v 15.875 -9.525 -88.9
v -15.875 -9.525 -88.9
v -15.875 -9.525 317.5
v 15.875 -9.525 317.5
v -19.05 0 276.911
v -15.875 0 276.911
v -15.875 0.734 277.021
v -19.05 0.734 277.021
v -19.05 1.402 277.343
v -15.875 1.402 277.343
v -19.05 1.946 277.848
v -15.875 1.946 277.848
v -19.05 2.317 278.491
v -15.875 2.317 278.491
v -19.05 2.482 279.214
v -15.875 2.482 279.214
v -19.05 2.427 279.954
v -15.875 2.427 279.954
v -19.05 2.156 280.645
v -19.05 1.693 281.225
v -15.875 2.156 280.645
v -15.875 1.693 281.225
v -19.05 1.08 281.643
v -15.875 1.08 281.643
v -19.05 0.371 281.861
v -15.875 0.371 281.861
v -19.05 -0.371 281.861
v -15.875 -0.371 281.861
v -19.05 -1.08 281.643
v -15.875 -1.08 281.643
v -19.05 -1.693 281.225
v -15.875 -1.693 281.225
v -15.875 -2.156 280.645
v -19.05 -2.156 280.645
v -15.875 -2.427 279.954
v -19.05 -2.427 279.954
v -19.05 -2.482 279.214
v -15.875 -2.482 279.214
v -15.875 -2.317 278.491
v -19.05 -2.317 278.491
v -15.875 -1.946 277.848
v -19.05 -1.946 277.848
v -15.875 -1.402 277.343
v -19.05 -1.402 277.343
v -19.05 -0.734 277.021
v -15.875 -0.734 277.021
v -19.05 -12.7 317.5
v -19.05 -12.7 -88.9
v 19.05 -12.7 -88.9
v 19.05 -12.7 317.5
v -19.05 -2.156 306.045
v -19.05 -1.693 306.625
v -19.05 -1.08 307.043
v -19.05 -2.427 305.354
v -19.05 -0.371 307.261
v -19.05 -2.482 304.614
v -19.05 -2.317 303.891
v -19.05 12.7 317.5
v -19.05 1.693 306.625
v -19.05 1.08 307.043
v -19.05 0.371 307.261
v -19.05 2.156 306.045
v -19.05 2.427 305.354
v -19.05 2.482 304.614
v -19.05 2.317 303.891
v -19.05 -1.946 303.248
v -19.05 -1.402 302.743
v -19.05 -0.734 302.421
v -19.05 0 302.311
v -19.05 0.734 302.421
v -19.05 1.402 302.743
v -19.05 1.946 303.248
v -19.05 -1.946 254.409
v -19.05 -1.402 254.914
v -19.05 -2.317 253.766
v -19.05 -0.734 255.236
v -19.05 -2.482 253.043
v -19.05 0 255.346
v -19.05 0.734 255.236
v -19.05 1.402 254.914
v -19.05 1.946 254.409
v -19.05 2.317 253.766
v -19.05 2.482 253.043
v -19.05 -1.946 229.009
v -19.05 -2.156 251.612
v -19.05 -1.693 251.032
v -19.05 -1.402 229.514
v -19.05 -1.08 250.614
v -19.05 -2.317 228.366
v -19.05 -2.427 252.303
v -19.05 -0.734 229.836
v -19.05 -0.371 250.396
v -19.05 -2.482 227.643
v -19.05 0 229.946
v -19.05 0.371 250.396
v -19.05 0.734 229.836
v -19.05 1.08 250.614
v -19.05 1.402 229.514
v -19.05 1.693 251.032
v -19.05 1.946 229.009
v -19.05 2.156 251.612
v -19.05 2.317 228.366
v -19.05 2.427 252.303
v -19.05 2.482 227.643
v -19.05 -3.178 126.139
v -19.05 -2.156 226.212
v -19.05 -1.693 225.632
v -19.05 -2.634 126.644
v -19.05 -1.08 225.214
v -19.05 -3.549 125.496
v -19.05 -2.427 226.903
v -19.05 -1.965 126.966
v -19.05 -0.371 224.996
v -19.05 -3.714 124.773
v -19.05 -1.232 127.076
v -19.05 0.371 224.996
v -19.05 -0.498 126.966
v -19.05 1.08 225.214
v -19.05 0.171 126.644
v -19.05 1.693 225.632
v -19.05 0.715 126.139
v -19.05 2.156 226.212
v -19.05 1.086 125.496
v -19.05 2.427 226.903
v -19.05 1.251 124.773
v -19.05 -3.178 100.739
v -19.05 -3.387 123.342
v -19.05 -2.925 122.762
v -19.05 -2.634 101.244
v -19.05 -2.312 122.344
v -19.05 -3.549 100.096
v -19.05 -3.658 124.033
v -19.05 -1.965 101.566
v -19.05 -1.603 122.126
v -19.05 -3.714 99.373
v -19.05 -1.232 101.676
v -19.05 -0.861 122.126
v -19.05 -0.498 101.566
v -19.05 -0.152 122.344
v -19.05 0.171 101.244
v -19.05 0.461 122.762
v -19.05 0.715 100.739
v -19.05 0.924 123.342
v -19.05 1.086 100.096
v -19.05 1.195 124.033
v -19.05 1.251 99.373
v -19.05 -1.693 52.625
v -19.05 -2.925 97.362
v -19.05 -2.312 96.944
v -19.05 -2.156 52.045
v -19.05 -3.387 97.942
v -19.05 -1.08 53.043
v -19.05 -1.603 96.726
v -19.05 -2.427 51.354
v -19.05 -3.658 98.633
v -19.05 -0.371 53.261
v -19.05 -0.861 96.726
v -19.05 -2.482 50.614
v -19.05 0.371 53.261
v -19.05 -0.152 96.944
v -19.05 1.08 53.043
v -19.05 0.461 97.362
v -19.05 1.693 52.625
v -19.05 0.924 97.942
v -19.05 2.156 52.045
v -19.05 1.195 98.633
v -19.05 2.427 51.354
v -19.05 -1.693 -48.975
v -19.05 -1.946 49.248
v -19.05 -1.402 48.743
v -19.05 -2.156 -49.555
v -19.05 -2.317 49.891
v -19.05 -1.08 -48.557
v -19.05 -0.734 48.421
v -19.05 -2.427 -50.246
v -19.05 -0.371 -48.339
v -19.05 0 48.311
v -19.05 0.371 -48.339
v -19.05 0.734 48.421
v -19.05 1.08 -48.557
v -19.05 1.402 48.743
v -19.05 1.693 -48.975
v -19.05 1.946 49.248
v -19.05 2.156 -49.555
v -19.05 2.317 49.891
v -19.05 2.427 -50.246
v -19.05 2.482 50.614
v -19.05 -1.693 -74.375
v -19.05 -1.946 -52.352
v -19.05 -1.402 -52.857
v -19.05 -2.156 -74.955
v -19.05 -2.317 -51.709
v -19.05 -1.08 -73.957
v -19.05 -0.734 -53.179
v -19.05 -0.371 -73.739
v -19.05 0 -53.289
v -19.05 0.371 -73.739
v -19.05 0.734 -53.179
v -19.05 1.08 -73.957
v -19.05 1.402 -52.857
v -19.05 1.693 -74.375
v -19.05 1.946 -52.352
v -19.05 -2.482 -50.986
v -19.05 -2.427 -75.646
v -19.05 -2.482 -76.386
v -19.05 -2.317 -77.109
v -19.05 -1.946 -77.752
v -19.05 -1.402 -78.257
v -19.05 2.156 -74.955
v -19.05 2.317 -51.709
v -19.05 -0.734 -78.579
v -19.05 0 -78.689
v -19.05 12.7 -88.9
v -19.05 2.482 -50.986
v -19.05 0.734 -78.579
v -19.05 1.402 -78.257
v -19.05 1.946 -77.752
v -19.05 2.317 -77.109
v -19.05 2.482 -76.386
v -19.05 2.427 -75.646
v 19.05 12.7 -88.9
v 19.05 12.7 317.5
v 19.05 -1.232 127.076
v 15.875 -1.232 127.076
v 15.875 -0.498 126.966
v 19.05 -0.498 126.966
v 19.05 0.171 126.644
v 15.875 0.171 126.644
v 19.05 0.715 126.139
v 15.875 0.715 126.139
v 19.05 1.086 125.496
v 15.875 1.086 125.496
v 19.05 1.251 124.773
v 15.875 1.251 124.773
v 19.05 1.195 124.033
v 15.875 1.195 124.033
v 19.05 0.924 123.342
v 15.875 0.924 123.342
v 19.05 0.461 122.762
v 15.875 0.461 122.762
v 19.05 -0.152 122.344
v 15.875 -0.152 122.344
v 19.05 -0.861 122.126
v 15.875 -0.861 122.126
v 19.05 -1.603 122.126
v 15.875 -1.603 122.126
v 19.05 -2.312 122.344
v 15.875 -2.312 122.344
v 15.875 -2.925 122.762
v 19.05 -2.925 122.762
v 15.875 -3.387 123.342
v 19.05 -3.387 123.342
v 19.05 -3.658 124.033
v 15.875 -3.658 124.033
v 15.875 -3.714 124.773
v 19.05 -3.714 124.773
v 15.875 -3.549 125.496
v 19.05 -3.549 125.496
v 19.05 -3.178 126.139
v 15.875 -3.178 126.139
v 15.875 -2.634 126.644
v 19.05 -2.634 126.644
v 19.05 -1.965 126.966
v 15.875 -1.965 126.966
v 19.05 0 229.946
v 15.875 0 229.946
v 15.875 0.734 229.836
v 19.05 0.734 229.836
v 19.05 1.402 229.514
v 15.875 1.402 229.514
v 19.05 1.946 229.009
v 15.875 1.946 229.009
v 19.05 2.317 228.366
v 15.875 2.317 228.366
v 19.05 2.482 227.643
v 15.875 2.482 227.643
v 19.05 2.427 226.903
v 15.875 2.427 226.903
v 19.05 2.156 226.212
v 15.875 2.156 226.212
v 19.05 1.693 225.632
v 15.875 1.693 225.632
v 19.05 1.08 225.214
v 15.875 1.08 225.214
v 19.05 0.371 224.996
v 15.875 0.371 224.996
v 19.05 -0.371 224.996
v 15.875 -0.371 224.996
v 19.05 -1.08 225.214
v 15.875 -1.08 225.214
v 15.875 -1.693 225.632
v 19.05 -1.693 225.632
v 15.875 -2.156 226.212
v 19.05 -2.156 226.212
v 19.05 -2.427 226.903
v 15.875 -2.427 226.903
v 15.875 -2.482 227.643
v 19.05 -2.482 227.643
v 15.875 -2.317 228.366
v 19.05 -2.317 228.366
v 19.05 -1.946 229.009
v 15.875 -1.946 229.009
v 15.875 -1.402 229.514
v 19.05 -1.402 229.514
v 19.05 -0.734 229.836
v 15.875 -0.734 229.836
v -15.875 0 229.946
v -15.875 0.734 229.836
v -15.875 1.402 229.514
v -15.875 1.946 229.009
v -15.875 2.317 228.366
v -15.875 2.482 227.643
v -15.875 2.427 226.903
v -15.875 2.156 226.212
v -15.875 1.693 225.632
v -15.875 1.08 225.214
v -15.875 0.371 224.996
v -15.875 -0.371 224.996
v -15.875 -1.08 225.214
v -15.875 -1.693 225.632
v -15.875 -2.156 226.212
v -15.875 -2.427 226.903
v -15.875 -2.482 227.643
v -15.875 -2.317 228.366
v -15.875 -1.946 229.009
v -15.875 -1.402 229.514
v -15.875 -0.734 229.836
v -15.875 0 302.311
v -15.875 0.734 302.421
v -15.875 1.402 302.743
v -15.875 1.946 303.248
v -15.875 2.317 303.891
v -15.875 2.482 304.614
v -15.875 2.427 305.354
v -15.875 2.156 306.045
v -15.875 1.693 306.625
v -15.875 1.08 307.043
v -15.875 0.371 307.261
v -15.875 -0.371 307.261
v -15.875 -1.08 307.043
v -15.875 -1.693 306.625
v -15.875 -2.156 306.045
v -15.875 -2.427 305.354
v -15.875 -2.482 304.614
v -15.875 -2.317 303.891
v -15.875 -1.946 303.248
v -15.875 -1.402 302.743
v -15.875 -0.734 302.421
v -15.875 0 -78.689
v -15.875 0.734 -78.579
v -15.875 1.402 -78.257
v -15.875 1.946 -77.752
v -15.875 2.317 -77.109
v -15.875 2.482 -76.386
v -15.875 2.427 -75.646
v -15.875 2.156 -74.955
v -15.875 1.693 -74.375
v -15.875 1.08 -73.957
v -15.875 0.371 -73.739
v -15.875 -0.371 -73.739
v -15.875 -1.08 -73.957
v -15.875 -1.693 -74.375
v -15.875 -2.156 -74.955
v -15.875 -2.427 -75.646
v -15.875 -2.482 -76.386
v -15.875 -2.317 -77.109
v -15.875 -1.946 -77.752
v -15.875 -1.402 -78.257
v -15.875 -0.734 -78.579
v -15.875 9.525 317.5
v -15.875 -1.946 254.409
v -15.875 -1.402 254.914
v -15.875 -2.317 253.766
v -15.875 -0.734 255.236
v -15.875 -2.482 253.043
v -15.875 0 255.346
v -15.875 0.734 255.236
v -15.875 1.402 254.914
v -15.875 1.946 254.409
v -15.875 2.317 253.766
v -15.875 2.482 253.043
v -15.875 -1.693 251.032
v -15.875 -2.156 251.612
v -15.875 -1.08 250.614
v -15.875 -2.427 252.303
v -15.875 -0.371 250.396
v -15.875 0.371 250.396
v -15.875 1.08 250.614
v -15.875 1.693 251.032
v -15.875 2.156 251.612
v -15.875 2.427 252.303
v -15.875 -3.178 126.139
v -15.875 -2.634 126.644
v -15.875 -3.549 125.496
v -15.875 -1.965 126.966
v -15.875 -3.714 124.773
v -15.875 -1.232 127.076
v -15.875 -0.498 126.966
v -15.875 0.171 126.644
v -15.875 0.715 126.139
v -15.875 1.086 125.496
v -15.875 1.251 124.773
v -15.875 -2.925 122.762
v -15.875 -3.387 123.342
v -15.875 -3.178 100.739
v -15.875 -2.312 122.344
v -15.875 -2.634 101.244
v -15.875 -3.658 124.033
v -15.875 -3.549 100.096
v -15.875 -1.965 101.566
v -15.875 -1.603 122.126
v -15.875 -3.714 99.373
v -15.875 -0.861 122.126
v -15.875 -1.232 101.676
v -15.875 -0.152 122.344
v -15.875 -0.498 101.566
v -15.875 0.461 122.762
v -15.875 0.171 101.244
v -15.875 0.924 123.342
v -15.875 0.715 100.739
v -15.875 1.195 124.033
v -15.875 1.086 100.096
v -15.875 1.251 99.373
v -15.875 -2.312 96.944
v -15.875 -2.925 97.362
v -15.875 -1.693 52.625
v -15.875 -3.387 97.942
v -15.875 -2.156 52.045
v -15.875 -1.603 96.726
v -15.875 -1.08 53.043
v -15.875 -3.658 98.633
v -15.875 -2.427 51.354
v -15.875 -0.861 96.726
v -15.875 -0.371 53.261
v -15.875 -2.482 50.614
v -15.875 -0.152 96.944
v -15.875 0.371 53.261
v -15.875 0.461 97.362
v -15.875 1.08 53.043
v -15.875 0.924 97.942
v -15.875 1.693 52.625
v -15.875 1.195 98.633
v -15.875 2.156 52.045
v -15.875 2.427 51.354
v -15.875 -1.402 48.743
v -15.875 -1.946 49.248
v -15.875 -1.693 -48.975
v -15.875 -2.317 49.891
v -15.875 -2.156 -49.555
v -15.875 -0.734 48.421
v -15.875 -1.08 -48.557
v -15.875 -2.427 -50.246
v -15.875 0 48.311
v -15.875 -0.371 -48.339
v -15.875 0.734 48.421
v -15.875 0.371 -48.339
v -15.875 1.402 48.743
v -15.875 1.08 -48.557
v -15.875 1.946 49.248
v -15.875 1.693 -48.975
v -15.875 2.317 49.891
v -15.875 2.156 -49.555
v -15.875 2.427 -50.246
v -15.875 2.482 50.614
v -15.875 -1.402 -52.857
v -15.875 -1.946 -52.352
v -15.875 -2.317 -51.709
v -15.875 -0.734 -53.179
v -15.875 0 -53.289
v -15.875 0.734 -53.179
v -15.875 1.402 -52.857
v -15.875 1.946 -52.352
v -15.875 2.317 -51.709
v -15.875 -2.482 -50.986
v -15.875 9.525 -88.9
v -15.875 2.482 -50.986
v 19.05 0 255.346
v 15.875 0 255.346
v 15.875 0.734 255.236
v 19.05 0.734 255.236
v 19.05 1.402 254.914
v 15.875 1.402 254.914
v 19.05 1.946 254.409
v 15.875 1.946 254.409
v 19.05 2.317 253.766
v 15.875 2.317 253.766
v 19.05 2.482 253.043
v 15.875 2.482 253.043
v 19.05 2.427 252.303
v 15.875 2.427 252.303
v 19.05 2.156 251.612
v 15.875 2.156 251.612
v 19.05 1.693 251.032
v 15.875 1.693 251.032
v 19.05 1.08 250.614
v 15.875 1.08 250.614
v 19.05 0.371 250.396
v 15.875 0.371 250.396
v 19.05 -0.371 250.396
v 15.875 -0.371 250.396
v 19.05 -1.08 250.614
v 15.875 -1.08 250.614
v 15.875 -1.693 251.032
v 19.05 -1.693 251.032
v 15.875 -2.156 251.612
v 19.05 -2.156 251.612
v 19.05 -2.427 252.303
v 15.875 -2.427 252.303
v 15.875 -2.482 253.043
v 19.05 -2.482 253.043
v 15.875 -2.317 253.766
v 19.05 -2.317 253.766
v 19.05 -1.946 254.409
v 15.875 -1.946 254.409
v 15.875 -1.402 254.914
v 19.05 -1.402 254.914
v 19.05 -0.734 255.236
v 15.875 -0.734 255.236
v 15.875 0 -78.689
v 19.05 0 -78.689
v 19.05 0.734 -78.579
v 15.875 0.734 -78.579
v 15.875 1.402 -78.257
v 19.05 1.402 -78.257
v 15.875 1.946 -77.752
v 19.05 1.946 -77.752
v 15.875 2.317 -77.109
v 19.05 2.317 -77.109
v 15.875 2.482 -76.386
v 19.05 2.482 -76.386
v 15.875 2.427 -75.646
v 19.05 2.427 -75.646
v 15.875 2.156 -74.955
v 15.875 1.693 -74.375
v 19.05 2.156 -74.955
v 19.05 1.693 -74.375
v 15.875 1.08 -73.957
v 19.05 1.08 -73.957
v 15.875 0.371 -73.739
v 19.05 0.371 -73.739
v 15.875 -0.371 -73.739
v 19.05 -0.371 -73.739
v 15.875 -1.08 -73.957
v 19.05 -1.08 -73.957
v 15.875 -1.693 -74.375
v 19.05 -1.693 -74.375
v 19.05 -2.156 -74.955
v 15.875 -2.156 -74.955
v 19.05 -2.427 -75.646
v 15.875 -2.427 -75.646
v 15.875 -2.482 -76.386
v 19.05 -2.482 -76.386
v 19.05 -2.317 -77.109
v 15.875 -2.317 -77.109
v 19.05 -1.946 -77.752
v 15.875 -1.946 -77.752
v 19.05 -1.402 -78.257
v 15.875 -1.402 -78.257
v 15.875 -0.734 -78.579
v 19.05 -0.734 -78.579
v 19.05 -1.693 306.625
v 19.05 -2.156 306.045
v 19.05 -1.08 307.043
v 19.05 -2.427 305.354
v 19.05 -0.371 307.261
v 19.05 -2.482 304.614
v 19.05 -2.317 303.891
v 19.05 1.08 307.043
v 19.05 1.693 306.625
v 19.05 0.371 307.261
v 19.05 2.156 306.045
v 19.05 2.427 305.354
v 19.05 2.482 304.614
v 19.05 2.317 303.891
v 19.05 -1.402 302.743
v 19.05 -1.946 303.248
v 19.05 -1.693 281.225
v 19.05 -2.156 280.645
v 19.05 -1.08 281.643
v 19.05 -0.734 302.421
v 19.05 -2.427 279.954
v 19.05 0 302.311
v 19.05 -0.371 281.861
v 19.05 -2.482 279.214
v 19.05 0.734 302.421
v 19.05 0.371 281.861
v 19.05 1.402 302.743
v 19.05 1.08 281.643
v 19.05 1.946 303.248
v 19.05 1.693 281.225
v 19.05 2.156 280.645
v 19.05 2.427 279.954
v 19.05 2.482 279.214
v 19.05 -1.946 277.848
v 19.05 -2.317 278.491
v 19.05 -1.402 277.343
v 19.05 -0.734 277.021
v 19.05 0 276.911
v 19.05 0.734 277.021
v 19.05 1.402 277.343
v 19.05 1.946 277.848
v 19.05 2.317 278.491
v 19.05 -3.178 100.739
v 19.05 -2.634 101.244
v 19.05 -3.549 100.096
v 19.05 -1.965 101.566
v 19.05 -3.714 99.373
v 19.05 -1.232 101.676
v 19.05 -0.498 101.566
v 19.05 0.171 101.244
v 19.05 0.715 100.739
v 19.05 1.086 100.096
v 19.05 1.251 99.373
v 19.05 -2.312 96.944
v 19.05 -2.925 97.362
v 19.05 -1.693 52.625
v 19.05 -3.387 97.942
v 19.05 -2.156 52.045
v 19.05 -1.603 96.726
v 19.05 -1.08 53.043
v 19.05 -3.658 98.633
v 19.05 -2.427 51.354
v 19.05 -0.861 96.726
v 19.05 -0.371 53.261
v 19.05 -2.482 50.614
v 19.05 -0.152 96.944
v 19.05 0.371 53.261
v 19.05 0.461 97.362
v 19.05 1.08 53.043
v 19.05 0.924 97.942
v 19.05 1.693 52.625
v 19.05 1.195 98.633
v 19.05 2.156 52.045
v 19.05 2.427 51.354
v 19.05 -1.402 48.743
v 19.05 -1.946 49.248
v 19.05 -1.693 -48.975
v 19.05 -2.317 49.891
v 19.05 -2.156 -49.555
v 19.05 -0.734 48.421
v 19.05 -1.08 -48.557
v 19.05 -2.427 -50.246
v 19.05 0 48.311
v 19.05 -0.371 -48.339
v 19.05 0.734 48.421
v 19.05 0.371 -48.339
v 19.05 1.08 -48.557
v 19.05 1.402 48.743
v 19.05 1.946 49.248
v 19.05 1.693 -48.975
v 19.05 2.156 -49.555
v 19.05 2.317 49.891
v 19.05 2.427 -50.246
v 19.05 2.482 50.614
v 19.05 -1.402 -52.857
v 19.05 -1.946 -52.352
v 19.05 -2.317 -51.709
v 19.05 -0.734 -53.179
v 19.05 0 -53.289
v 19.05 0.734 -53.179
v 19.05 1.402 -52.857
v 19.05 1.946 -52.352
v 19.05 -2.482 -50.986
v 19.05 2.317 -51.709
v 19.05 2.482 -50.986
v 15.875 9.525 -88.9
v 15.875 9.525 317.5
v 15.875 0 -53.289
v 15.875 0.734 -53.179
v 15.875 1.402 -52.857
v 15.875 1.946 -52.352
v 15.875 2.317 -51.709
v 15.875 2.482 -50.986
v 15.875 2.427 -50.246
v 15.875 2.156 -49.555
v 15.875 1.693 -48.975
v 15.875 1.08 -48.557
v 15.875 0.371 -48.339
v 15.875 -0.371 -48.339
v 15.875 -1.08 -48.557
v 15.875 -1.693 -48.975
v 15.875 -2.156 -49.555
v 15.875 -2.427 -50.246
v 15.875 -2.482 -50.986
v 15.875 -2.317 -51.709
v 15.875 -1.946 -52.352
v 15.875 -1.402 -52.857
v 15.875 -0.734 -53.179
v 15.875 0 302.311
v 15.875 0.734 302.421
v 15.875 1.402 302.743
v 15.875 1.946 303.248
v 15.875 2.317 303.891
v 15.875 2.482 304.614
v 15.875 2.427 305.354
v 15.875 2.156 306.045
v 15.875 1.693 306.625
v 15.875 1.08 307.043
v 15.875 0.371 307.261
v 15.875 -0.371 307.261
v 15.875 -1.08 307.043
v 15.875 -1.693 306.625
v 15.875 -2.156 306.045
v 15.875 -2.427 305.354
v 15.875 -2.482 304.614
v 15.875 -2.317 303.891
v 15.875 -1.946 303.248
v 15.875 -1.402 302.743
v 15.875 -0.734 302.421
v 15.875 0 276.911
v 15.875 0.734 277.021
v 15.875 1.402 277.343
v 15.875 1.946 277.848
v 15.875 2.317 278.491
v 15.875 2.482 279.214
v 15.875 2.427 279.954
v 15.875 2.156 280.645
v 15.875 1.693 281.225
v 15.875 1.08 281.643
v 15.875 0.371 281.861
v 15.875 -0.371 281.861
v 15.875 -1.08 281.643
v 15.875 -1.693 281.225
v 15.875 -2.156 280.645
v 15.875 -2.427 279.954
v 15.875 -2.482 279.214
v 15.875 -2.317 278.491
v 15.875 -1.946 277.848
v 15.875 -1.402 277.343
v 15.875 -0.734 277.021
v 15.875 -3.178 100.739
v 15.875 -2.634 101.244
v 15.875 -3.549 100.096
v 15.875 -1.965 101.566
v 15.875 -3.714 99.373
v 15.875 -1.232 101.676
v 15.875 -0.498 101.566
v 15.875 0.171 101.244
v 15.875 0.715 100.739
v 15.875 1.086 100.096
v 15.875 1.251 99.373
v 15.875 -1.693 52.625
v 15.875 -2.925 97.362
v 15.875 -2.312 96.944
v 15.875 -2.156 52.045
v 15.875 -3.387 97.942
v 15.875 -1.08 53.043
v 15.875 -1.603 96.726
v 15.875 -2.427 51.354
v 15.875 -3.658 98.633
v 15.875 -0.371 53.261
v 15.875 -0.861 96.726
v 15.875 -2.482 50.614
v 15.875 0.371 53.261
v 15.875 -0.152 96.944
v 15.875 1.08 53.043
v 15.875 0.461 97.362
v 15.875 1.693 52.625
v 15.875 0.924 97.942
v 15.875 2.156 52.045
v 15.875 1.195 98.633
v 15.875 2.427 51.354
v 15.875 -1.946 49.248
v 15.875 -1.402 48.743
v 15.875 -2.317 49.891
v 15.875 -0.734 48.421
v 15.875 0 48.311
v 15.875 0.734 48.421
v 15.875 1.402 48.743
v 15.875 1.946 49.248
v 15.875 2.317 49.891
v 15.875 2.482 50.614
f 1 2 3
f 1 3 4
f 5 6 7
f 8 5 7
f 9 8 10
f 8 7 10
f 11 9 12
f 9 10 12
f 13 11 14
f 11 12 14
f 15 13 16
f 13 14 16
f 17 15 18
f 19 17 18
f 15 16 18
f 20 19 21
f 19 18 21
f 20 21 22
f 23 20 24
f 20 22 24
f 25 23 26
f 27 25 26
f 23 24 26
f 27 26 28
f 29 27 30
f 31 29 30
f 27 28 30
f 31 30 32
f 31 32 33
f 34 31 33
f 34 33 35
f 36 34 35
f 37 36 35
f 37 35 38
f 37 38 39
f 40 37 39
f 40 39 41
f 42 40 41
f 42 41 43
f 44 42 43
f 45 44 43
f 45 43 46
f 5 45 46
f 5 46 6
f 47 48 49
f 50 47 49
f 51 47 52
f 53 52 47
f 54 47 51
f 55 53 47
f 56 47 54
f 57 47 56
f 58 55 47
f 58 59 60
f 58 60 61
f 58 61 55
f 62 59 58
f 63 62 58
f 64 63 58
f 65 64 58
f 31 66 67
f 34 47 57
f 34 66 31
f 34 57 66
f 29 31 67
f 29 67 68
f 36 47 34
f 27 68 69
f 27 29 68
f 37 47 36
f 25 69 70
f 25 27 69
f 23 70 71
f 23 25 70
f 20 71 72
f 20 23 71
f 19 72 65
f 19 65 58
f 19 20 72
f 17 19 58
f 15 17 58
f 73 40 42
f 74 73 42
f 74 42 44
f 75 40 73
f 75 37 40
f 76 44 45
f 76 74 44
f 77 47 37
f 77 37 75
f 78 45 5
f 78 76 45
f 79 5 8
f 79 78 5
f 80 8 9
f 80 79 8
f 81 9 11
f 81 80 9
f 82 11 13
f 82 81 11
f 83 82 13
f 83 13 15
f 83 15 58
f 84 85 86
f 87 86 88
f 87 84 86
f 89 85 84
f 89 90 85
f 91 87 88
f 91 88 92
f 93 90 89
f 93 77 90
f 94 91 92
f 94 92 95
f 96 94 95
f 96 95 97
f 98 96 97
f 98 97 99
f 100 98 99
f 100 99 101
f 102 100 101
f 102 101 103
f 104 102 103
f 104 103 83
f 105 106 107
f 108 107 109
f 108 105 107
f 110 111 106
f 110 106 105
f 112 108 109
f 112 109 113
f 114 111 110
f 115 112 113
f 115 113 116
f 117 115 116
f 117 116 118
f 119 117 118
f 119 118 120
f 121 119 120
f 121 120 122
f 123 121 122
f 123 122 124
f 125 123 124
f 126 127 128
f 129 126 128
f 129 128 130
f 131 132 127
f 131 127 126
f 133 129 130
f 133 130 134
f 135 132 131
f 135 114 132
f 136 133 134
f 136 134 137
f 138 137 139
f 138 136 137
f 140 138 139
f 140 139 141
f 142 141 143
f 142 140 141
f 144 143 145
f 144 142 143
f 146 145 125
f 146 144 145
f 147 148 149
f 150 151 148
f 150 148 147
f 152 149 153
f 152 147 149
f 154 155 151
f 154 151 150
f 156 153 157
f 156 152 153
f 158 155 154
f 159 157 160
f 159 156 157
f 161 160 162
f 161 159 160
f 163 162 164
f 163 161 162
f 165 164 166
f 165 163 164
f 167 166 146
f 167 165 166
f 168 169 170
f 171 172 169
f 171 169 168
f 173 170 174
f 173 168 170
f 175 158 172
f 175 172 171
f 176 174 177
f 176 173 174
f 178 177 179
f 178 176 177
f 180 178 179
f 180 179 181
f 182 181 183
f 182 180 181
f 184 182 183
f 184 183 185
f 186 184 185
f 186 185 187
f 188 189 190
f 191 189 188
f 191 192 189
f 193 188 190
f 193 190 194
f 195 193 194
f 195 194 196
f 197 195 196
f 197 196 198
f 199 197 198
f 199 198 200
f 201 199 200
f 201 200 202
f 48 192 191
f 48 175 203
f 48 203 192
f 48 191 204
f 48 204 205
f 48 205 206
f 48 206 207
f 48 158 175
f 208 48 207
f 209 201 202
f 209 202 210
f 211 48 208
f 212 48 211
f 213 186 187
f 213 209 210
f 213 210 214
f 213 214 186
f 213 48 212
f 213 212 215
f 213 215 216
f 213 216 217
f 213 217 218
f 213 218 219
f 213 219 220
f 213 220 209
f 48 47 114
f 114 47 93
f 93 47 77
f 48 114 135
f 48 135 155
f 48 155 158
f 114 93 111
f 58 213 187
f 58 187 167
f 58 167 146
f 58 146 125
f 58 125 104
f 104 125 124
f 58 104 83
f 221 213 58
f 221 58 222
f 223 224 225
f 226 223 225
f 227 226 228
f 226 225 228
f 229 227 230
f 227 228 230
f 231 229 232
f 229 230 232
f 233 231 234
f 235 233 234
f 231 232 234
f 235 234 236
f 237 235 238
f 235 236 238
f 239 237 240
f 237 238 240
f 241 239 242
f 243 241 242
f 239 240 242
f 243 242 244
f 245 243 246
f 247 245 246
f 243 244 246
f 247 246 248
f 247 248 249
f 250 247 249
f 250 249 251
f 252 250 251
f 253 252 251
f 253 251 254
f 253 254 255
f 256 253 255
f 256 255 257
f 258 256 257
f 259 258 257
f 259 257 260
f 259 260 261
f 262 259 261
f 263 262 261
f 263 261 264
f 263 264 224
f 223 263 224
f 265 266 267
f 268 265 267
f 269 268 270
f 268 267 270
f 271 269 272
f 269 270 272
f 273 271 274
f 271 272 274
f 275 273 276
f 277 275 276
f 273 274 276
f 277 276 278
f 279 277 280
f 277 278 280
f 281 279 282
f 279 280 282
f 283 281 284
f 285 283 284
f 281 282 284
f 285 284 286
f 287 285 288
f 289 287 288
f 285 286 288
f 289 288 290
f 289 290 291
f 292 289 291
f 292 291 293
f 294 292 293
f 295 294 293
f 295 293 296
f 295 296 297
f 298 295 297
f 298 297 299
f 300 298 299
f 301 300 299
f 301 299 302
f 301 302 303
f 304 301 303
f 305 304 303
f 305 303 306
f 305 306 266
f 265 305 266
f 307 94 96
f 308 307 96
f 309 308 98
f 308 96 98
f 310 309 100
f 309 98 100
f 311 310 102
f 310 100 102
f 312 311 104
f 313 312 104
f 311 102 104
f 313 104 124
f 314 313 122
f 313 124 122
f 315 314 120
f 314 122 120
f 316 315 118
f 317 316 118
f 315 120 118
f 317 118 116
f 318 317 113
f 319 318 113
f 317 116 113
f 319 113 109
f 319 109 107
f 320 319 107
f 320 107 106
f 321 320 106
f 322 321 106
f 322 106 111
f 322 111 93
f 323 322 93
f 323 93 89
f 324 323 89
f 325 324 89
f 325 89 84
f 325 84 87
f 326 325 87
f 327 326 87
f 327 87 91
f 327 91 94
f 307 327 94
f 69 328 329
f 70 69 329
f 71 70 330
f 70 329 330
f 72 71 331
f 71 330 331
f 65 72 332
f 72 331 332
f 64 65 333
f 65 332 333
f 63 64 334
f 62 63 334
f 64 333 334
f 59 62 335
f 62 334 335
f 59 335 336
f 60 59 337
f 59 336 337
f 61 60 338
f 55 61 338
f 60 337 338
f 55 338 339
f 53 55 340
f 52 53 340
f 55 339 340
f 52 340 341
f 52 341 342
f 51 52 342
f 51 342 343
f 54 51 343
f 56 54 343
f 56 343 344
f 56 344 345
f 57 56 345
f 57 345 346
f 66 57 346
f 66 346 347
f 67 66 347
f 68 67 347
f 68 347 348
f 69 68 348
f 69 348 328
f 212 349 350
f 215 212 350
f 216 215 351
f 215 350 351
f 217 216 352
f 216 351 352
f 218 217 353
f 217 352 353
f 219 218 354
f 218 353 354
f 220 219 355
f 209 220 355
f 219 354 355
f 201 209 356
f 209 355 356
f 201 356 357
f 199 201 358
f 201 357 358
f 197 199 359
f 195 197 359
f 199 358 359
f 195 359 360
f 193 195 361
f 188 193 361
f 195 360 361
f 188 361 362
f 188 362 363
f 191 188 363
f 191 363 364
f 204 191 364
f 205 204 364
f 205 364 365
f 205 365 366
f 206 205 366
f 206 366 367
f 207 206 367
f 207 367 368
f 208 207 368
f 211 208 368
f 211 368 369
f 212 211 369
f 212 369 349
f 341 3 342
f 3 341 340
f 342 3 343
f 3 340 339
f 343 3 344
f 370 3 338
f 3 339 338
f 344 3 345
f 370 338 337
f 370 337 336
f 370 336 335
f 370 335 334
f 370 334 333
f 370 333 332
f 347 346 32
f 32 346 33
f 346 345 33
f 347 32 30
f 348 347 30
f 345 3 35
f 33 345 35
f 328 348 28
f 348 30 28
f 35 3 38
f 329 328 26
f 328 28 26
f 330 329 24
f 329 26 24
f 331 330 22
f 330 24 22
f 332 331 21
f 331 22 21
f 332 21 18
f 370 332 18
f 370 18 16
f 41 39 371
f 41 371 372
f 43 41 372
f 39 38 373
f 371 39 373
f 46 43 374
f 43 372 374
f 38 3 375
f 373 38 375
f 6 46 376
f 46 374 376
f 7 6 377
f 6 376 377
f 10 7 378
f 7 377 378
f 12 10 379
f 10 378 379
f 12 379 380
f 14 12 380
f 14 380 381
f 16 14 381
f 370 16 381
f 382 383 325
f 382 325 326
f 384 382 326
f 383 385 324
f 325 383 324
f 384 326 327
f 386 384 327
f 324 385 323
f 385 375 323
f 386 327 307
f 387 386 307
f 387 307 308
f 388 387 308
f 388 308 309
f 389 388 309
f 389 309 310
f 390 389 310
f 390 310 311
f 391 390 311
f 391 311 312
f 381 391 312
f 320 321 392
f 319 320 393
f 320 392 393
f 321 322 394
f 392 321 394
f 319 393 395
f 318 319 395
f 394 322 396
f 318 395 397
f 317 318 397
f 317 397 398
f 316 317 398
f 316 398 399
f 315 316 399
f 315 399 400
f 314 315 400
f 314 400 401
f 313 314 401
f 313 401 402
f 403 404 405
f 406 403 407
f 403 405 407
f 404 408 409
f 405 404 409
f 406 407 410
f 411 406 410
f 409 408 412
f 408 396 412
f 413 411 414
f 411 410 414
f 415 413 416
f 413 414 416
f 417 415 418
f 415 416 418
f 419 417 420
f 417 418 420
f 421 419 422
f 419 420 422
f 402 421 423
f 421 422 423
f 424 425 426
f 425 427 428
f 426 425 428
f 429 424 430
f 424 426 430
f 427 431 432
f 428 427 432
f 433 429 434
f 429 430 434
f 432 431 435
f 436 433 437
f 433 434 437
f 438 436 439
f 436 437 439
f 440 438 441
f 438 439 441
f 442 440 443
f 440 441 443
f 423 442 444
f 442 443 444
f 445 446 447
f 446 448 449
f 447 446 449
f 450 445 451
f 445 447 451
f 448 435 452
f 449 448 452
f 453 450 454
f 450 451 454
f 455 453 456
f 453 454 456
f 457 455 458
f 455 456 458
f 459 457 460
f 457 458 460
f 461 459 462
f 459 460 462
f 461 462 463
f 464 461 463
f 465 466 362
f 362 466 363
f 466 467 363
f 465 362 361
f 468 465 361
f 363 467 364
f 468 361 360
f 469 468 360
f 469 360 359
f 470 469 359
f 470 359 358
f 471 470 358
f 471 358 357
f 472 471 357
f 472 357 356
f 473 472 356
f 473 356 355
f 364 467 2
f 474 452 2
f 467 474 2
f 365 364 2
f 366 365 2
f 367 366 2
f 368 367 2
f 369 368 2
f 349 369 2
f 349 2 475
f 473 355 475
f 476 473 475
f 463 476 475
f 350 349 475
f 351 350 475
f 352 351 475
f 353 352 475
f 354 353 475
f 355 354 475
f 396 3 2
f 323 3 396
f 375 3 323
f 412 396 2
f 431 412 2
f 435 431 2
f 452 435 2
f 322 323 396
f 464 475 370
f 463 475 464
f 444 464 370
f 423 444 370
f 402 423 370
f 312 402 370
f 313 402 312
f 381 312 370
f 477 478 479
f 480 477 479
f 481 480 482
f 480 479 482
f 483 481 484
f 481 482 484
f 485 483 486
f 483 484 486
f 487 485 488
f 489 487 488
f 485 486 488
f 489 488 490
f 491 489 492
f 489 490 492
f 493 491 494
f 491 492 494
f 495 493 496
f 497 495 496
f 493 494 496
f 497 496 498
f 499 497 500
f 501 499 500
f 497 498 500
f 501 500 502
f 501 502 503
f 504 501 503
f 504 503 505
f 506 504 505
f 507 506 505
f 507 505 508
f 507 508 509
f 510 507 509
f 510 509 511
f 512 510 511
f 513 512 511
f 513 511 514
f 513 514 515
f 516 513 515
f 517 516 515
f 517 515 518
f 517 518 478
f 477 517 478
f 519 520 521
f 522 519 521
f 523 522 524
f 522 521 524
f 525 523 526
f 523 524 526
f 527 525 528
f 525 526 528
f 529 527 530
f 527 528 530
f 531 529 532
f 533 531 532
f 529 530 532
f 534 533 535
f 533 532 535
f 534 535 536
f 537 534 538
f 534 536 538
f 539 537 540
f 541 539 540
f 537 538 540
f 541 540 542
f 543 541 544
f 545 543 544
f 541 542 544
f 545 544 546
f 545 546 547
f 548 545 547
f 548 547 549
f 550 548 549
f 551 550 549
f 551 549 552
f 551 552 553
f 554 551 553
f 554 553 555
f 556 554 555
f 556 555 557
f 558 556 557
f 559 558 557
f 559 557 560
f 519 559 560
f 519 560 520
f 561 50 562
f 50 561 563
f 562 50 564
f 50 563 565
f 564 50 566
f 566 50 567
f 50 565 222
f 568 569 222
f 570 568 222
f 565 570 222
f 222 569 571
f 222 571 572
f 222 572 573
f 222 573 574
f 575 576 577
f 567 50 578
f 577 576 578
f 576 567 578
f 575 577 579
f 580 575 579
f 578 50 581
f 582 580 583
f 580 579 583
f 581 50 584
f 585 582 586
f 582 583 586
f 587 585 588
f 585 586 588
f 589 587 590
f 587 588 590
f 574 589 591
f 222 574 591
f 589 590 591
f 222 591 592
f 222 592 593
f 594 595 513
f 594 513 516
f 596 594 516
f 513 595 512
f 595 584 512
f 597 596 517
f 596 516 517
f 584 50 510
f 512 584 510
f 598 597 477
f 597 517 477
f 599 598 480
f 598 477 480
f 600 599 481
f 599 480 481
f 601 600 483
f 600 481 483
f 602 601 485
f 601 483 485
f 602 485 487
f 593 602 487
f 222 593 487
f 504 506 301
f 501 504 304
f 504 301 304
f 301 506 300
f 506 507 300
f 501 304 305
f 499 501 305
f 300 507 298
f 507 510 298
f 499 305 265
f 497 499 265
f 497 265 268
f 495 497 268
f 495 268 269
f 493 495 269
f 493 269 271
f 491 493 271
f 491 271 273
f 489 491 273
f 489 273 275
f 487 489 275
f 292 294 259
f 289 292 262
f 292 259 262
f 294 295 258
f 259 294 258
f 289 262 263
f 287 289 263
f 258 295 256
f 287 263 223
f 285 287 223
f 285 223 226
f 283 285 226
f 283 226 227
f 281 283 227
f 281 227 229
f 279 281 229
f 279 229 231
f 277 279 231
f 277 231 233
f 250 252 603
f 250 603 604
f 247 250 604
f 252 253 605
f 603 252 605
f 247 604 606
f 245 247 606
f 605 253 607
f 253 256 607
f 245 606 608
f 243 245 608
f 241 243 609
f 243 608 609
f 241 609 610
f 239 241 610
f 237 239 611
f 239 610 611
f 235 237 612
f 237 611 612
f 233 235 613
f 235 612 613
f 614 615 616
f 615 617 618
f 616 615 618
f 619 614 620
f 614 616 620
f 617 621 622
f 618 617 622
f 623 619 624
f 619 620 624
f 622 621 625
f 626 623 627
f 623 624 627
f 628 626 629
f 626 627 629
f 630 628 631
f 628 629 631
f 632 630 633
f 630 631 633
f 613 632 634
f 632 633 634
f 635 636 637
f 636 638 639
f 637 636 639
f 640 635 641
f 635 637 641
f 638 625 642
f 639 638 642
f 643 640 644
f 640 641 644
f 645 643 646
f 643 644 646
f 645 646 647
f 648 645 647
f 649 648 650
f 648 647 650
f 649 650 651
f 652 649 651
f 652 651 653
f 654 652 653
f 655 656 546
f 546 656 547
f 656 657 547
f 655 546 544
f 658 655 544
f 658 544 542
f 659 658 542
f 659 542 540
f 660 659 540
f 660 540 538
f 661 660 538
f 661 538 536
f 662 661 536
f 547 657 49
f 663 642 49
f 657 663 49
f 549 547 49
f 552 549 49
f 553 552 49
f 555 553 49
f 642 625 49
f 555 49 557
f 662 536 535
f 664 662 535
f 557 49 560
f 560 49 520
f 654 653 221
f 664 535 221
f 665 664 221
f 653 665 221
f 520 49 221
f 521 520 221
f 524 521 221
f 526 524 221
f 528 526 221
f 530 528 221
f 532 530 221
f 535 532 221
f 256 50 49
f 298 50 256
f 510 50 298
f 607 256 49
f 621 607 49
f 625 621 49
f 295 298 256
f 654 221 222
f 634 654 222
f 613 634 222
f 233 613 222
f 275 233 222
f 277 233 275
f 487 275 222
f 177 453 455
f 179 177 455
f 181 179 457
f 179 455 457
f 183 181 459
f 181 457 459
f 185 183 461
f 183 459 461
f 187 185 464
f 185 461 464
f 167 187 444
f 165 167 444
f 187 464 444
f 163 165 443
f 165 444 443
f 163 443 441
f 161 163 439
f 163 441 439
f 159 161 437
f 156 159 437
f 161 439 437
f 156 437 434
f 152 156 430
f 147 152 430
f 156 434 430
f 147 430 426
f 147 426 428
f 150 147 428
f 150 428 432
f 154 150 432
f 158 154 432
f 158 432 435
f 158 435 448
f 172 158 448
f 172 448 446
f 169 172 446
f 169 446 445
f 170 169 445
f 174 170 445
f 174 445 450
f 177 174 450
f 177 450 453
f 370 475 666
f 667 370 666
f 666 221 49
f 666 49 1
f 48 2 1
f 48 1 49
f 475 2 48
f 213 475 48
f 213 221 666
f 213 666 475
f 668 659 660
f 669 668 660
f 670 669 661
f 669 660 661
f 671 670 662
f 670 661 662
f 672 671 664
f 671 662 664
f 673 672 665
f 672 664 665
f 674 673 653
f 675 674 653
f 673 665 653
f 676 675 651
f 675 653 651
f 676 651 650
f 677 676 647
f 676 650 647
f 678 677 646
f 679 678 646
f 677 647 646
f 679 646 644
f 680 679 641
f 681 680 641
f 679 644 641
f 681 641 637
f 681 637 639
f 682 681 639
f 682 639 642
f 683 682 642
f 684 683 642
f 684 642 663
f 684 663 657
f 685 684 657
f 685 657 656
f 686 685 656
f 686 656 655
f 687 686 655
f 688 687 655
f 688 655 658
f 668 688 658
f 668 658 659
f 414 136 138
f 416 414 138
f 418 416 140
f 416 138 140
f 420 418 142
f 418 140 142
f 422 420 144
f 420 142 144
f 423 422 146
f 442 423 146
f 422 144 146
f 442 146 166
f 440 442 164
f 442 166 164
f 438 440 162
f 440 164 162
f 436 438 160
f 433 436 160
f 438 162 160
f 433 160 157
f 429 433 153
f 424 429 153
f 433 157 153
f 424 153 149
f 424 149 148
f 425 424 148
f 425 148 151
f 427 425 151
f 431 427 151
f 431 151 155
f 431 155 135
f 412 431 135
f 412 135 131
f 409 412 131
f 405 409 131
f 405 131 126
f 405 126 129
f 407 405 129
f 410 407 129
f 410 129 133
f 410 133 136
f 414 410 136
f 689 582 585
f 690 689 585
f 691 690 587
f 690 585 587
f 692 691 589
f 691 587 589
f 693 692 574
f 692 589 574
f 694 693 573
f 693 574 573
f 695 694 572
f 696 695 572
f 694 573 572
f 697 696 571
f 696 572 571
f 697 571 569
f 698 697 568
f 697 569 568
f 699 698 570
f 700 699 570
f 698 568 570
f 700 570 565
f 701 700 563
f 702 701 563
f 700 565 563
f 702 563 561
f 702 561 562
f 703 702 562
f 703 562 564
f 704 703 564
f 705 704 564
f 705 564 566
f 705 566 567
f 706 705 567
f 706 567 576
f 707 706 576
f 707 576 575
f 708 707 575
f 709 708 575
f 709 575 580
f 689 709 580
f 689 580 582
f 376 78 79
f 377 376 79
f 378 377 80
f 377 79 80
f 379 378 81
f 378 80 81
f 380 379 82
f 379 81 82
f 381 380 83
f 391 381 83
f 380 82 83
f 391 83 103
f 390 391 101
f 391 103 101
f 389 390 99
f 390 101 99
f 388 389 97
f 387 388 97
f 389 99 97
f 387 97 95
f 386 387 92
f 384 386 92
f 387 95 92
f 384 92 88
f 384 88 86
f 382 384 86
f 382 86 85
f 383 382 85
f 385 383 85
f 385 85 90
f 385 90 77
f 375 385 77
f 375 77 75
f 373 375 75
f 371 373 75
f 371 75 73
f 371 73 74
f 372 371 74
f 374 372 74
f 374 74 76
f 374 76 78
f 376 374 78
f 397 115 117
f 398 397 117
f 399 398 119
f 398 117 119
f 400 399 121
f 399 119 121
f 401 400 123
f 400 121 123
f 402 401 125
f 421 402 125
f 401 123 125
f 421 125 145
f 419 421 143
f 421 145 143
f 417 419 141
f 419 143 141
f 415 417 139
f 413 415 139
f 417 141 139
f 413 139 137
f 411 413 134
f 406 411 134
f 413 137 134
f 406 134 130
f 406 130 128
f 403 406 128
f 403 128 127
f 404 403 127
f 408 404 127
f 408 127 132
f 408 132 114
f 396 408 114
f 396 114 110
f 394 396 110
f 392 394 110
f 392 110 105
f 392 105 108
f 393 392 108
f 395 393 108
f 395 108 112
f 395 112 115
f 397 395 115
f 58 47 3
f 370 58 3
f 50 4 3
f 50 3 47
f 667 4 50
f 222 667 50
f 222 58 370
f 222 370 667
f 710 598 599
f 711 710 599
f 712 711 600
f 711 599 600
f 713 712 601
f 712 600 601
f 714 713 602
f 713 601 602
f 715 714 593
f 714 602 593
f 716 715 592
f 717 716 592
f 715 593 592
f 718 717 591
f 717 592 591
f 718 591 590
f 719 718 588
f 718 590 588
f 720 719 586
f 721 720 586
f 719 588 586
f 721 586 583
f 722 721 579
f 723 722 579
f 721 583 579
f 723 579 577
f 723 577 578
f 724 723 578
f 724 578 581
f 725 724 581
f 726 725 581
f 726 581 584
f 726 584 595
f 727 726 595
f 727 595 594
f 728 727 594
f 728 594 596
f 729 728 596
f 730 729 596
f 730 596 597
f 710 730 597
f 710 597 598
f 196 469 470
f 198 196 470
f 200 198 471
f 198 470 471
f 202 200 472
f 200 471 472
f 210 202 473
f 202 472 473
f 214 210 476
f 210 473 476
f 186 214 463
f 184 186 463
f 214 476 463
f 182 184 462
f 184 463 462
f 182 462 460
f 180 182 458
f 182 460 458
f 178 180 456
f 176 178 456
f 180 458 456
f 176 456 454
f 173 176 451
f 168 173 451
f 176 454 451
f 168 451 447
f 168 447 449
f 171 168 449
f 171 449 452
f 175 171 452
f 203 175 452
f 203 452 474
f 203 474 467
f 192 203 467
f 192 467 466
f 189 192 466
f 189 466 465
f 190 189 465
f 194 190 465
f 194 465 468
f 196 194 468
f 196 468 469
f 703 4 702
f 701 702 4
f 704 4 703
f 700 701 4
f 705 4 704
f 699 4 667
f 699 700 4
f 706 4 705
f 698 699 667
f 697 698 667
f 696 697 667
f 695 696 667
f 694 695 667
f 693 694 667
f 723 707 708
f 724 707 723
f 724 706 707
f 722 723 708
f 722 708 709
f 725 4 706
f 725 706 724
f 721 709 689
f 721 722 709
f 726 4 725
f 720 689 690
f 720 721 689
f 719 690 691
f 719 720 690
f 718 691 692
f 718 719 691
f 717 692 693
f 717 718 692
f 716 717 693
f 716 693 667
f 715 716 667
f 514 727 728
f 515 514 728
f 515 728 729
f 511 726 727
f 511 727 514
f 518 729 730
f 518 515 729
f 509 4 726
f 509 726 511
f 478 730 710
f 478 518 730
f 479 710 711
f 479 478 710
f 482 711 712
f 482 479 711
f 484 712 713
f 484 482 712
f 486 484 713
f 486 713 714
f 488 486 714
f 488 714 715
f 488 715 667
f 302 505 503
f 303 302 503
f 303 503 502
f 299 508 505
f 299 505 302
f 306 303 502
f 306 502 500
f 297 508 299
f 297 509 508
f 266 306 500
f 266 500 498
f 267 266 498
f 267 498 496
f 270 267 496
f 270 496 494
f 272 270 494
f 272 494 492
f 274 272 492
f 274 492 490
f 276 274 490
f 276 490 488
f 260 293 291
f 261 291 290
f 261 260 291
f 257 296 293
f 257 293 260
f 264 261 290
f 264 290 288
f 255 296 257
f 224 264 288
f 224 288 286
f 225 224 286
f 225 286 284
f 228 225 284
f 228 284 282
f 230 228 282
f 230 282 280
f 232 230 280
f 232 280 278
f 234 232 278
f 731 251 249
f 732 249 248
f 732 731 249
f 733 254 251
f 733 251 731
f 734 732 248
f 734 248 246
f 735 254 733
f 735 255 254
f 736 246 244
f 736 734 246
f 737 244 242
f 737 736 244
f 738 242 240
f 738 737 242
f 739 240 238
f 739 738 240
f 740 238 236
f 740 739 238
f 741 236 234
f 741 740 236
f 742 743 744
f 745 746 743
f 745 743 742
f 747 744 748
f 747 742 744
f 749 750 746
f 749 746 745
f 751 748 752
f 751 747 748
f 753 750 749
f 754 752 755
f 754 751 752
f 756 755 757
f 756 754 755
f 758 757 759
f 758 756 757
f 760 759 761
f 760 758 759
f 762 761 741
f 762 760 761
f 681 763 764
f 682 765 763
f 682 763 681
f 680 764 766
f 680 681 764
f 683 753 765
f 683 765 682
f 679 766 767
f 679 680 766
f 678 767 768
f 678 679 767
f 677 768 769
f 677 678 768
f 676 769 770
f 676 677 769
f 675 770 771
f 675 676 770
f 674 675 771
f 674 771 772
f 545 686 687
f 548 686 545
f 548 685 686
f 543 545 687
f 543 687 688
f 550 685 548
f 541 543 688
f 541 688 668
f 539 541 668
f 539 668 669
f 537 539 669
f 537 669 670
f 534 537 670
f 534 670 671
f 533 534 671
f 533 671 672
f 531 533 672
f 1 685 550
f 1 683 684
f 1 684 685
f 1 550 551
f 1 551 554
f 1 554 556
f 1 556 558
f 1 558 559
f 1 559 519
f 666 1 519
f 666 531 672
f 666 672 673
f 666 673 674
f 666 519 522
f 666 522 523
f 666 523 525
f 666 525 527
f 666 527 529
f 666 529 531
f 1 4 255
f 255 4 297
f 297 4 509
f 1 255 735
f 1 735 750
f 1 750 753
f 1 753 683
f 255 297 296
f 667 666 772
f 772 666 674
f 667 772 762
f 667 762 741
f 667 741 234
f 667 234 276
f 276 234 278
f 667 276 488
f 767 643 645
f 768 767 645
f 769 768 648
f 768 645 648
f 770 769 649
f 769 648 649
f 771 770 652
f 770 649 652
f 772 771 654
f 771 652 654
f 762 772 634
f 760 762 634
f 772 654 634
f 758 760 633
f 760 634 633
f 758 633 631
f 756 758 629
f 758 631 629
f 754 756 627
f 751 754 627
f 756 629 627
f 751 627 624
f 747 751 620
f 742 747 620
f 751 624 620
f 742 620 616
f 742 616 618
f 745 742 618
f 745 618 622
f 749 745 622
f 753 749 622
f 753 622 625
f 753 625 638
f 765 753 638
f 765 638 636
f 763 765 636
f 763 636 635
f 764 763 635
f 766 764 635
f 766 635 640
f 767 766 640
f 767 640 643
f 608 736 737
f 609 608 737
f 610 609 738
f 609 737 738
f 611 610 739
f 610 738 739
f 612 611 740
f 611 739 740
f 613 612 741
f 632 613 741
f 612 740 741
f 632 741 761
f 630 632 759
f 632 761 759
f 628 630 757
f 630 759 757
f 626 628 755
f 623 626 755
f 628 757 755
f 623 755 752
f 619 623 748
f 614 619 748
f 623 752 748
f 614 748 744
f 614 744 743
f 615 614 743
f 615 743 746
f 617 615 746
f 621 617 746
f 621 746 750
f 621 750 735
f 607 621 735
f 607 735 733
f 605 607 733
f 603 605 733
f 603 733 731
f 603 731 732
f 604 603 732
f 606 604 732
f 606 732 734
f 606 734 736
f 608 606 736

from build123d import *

# Parameters (mm, degrees)
BOSS_EXTRUDE1_DEPTH      = 317.499999
BOSS_EXTRUDE1_DEPTH_BACK = 317.499999
SKETCH3_W                = 38.1
SKETCH3_H                = 25.4
SKETCH3_W_2              = 31.75
SKETCH3_H_2              = 19.05
MOUNTING_HOLES_D         = 4.9784
RIO_HOLES_D              = 4.9784
F_10_CLEARANCE_HOLE1_D   = 4.9784


with BuildPart() as part:
    # Sketch3 → Boss-Extrude1 (new, two sides: drawn at the far end of the back side and taken through both)
    with BuildSketch(Plane.XY.offset(-BOSS_EXTRUDE1_DEPTH_BACK)):
        Rectangle(SKETCH3_W, SKETCH3_H)
        Rectangle(SKETCH3_W_2, SKETCH3_H_2, mode=Mode.SUBTRACT)
    extrude(amount=BOSS_EXTRUDE1_DEPTH + BOSS_EXTRUDE1_DEPTH_BACK)

    # Mounting Holes (through all)
    with Locations(Plane.ZY.offset(19.05)):
        with Locations((279.400000508, 0), (304.800000508, 0), (-76.2, 0)):
            Hole(MOUNTING_HOLES_D / 2)

    # Rio Holes (through all)
    with Locations(Plane.ZY.offset(19.05)):
        with Locations((-50.8, 0), (50.8, 0)):
            Hole(RIO_HOLES_D / 2)

    # SurfaceCut1
    split(bisect_by=Plane(origin=(0, 0, -88.899999492), x_dir=(-1, 0, 0), z_dir=(0, 0, -1)), keep=Keep.BOTTOM)

    # #10 Clearance Hole1 (through all)
    with Locations(Plane(origin=(19.05, 0, 0), x_dir=(0, 0, -1), z_dir=(1, 0, 0))):
        with Locations((-252.857000508, -5.03e-07), (-227.457000508, -5.03e-07), (-99.187000508, -1.231595708), (-124.587000508, -1.231595708)):
            Hole(F_10_CLEARANCE_HOLE1_D / 2)


solid = part.part
